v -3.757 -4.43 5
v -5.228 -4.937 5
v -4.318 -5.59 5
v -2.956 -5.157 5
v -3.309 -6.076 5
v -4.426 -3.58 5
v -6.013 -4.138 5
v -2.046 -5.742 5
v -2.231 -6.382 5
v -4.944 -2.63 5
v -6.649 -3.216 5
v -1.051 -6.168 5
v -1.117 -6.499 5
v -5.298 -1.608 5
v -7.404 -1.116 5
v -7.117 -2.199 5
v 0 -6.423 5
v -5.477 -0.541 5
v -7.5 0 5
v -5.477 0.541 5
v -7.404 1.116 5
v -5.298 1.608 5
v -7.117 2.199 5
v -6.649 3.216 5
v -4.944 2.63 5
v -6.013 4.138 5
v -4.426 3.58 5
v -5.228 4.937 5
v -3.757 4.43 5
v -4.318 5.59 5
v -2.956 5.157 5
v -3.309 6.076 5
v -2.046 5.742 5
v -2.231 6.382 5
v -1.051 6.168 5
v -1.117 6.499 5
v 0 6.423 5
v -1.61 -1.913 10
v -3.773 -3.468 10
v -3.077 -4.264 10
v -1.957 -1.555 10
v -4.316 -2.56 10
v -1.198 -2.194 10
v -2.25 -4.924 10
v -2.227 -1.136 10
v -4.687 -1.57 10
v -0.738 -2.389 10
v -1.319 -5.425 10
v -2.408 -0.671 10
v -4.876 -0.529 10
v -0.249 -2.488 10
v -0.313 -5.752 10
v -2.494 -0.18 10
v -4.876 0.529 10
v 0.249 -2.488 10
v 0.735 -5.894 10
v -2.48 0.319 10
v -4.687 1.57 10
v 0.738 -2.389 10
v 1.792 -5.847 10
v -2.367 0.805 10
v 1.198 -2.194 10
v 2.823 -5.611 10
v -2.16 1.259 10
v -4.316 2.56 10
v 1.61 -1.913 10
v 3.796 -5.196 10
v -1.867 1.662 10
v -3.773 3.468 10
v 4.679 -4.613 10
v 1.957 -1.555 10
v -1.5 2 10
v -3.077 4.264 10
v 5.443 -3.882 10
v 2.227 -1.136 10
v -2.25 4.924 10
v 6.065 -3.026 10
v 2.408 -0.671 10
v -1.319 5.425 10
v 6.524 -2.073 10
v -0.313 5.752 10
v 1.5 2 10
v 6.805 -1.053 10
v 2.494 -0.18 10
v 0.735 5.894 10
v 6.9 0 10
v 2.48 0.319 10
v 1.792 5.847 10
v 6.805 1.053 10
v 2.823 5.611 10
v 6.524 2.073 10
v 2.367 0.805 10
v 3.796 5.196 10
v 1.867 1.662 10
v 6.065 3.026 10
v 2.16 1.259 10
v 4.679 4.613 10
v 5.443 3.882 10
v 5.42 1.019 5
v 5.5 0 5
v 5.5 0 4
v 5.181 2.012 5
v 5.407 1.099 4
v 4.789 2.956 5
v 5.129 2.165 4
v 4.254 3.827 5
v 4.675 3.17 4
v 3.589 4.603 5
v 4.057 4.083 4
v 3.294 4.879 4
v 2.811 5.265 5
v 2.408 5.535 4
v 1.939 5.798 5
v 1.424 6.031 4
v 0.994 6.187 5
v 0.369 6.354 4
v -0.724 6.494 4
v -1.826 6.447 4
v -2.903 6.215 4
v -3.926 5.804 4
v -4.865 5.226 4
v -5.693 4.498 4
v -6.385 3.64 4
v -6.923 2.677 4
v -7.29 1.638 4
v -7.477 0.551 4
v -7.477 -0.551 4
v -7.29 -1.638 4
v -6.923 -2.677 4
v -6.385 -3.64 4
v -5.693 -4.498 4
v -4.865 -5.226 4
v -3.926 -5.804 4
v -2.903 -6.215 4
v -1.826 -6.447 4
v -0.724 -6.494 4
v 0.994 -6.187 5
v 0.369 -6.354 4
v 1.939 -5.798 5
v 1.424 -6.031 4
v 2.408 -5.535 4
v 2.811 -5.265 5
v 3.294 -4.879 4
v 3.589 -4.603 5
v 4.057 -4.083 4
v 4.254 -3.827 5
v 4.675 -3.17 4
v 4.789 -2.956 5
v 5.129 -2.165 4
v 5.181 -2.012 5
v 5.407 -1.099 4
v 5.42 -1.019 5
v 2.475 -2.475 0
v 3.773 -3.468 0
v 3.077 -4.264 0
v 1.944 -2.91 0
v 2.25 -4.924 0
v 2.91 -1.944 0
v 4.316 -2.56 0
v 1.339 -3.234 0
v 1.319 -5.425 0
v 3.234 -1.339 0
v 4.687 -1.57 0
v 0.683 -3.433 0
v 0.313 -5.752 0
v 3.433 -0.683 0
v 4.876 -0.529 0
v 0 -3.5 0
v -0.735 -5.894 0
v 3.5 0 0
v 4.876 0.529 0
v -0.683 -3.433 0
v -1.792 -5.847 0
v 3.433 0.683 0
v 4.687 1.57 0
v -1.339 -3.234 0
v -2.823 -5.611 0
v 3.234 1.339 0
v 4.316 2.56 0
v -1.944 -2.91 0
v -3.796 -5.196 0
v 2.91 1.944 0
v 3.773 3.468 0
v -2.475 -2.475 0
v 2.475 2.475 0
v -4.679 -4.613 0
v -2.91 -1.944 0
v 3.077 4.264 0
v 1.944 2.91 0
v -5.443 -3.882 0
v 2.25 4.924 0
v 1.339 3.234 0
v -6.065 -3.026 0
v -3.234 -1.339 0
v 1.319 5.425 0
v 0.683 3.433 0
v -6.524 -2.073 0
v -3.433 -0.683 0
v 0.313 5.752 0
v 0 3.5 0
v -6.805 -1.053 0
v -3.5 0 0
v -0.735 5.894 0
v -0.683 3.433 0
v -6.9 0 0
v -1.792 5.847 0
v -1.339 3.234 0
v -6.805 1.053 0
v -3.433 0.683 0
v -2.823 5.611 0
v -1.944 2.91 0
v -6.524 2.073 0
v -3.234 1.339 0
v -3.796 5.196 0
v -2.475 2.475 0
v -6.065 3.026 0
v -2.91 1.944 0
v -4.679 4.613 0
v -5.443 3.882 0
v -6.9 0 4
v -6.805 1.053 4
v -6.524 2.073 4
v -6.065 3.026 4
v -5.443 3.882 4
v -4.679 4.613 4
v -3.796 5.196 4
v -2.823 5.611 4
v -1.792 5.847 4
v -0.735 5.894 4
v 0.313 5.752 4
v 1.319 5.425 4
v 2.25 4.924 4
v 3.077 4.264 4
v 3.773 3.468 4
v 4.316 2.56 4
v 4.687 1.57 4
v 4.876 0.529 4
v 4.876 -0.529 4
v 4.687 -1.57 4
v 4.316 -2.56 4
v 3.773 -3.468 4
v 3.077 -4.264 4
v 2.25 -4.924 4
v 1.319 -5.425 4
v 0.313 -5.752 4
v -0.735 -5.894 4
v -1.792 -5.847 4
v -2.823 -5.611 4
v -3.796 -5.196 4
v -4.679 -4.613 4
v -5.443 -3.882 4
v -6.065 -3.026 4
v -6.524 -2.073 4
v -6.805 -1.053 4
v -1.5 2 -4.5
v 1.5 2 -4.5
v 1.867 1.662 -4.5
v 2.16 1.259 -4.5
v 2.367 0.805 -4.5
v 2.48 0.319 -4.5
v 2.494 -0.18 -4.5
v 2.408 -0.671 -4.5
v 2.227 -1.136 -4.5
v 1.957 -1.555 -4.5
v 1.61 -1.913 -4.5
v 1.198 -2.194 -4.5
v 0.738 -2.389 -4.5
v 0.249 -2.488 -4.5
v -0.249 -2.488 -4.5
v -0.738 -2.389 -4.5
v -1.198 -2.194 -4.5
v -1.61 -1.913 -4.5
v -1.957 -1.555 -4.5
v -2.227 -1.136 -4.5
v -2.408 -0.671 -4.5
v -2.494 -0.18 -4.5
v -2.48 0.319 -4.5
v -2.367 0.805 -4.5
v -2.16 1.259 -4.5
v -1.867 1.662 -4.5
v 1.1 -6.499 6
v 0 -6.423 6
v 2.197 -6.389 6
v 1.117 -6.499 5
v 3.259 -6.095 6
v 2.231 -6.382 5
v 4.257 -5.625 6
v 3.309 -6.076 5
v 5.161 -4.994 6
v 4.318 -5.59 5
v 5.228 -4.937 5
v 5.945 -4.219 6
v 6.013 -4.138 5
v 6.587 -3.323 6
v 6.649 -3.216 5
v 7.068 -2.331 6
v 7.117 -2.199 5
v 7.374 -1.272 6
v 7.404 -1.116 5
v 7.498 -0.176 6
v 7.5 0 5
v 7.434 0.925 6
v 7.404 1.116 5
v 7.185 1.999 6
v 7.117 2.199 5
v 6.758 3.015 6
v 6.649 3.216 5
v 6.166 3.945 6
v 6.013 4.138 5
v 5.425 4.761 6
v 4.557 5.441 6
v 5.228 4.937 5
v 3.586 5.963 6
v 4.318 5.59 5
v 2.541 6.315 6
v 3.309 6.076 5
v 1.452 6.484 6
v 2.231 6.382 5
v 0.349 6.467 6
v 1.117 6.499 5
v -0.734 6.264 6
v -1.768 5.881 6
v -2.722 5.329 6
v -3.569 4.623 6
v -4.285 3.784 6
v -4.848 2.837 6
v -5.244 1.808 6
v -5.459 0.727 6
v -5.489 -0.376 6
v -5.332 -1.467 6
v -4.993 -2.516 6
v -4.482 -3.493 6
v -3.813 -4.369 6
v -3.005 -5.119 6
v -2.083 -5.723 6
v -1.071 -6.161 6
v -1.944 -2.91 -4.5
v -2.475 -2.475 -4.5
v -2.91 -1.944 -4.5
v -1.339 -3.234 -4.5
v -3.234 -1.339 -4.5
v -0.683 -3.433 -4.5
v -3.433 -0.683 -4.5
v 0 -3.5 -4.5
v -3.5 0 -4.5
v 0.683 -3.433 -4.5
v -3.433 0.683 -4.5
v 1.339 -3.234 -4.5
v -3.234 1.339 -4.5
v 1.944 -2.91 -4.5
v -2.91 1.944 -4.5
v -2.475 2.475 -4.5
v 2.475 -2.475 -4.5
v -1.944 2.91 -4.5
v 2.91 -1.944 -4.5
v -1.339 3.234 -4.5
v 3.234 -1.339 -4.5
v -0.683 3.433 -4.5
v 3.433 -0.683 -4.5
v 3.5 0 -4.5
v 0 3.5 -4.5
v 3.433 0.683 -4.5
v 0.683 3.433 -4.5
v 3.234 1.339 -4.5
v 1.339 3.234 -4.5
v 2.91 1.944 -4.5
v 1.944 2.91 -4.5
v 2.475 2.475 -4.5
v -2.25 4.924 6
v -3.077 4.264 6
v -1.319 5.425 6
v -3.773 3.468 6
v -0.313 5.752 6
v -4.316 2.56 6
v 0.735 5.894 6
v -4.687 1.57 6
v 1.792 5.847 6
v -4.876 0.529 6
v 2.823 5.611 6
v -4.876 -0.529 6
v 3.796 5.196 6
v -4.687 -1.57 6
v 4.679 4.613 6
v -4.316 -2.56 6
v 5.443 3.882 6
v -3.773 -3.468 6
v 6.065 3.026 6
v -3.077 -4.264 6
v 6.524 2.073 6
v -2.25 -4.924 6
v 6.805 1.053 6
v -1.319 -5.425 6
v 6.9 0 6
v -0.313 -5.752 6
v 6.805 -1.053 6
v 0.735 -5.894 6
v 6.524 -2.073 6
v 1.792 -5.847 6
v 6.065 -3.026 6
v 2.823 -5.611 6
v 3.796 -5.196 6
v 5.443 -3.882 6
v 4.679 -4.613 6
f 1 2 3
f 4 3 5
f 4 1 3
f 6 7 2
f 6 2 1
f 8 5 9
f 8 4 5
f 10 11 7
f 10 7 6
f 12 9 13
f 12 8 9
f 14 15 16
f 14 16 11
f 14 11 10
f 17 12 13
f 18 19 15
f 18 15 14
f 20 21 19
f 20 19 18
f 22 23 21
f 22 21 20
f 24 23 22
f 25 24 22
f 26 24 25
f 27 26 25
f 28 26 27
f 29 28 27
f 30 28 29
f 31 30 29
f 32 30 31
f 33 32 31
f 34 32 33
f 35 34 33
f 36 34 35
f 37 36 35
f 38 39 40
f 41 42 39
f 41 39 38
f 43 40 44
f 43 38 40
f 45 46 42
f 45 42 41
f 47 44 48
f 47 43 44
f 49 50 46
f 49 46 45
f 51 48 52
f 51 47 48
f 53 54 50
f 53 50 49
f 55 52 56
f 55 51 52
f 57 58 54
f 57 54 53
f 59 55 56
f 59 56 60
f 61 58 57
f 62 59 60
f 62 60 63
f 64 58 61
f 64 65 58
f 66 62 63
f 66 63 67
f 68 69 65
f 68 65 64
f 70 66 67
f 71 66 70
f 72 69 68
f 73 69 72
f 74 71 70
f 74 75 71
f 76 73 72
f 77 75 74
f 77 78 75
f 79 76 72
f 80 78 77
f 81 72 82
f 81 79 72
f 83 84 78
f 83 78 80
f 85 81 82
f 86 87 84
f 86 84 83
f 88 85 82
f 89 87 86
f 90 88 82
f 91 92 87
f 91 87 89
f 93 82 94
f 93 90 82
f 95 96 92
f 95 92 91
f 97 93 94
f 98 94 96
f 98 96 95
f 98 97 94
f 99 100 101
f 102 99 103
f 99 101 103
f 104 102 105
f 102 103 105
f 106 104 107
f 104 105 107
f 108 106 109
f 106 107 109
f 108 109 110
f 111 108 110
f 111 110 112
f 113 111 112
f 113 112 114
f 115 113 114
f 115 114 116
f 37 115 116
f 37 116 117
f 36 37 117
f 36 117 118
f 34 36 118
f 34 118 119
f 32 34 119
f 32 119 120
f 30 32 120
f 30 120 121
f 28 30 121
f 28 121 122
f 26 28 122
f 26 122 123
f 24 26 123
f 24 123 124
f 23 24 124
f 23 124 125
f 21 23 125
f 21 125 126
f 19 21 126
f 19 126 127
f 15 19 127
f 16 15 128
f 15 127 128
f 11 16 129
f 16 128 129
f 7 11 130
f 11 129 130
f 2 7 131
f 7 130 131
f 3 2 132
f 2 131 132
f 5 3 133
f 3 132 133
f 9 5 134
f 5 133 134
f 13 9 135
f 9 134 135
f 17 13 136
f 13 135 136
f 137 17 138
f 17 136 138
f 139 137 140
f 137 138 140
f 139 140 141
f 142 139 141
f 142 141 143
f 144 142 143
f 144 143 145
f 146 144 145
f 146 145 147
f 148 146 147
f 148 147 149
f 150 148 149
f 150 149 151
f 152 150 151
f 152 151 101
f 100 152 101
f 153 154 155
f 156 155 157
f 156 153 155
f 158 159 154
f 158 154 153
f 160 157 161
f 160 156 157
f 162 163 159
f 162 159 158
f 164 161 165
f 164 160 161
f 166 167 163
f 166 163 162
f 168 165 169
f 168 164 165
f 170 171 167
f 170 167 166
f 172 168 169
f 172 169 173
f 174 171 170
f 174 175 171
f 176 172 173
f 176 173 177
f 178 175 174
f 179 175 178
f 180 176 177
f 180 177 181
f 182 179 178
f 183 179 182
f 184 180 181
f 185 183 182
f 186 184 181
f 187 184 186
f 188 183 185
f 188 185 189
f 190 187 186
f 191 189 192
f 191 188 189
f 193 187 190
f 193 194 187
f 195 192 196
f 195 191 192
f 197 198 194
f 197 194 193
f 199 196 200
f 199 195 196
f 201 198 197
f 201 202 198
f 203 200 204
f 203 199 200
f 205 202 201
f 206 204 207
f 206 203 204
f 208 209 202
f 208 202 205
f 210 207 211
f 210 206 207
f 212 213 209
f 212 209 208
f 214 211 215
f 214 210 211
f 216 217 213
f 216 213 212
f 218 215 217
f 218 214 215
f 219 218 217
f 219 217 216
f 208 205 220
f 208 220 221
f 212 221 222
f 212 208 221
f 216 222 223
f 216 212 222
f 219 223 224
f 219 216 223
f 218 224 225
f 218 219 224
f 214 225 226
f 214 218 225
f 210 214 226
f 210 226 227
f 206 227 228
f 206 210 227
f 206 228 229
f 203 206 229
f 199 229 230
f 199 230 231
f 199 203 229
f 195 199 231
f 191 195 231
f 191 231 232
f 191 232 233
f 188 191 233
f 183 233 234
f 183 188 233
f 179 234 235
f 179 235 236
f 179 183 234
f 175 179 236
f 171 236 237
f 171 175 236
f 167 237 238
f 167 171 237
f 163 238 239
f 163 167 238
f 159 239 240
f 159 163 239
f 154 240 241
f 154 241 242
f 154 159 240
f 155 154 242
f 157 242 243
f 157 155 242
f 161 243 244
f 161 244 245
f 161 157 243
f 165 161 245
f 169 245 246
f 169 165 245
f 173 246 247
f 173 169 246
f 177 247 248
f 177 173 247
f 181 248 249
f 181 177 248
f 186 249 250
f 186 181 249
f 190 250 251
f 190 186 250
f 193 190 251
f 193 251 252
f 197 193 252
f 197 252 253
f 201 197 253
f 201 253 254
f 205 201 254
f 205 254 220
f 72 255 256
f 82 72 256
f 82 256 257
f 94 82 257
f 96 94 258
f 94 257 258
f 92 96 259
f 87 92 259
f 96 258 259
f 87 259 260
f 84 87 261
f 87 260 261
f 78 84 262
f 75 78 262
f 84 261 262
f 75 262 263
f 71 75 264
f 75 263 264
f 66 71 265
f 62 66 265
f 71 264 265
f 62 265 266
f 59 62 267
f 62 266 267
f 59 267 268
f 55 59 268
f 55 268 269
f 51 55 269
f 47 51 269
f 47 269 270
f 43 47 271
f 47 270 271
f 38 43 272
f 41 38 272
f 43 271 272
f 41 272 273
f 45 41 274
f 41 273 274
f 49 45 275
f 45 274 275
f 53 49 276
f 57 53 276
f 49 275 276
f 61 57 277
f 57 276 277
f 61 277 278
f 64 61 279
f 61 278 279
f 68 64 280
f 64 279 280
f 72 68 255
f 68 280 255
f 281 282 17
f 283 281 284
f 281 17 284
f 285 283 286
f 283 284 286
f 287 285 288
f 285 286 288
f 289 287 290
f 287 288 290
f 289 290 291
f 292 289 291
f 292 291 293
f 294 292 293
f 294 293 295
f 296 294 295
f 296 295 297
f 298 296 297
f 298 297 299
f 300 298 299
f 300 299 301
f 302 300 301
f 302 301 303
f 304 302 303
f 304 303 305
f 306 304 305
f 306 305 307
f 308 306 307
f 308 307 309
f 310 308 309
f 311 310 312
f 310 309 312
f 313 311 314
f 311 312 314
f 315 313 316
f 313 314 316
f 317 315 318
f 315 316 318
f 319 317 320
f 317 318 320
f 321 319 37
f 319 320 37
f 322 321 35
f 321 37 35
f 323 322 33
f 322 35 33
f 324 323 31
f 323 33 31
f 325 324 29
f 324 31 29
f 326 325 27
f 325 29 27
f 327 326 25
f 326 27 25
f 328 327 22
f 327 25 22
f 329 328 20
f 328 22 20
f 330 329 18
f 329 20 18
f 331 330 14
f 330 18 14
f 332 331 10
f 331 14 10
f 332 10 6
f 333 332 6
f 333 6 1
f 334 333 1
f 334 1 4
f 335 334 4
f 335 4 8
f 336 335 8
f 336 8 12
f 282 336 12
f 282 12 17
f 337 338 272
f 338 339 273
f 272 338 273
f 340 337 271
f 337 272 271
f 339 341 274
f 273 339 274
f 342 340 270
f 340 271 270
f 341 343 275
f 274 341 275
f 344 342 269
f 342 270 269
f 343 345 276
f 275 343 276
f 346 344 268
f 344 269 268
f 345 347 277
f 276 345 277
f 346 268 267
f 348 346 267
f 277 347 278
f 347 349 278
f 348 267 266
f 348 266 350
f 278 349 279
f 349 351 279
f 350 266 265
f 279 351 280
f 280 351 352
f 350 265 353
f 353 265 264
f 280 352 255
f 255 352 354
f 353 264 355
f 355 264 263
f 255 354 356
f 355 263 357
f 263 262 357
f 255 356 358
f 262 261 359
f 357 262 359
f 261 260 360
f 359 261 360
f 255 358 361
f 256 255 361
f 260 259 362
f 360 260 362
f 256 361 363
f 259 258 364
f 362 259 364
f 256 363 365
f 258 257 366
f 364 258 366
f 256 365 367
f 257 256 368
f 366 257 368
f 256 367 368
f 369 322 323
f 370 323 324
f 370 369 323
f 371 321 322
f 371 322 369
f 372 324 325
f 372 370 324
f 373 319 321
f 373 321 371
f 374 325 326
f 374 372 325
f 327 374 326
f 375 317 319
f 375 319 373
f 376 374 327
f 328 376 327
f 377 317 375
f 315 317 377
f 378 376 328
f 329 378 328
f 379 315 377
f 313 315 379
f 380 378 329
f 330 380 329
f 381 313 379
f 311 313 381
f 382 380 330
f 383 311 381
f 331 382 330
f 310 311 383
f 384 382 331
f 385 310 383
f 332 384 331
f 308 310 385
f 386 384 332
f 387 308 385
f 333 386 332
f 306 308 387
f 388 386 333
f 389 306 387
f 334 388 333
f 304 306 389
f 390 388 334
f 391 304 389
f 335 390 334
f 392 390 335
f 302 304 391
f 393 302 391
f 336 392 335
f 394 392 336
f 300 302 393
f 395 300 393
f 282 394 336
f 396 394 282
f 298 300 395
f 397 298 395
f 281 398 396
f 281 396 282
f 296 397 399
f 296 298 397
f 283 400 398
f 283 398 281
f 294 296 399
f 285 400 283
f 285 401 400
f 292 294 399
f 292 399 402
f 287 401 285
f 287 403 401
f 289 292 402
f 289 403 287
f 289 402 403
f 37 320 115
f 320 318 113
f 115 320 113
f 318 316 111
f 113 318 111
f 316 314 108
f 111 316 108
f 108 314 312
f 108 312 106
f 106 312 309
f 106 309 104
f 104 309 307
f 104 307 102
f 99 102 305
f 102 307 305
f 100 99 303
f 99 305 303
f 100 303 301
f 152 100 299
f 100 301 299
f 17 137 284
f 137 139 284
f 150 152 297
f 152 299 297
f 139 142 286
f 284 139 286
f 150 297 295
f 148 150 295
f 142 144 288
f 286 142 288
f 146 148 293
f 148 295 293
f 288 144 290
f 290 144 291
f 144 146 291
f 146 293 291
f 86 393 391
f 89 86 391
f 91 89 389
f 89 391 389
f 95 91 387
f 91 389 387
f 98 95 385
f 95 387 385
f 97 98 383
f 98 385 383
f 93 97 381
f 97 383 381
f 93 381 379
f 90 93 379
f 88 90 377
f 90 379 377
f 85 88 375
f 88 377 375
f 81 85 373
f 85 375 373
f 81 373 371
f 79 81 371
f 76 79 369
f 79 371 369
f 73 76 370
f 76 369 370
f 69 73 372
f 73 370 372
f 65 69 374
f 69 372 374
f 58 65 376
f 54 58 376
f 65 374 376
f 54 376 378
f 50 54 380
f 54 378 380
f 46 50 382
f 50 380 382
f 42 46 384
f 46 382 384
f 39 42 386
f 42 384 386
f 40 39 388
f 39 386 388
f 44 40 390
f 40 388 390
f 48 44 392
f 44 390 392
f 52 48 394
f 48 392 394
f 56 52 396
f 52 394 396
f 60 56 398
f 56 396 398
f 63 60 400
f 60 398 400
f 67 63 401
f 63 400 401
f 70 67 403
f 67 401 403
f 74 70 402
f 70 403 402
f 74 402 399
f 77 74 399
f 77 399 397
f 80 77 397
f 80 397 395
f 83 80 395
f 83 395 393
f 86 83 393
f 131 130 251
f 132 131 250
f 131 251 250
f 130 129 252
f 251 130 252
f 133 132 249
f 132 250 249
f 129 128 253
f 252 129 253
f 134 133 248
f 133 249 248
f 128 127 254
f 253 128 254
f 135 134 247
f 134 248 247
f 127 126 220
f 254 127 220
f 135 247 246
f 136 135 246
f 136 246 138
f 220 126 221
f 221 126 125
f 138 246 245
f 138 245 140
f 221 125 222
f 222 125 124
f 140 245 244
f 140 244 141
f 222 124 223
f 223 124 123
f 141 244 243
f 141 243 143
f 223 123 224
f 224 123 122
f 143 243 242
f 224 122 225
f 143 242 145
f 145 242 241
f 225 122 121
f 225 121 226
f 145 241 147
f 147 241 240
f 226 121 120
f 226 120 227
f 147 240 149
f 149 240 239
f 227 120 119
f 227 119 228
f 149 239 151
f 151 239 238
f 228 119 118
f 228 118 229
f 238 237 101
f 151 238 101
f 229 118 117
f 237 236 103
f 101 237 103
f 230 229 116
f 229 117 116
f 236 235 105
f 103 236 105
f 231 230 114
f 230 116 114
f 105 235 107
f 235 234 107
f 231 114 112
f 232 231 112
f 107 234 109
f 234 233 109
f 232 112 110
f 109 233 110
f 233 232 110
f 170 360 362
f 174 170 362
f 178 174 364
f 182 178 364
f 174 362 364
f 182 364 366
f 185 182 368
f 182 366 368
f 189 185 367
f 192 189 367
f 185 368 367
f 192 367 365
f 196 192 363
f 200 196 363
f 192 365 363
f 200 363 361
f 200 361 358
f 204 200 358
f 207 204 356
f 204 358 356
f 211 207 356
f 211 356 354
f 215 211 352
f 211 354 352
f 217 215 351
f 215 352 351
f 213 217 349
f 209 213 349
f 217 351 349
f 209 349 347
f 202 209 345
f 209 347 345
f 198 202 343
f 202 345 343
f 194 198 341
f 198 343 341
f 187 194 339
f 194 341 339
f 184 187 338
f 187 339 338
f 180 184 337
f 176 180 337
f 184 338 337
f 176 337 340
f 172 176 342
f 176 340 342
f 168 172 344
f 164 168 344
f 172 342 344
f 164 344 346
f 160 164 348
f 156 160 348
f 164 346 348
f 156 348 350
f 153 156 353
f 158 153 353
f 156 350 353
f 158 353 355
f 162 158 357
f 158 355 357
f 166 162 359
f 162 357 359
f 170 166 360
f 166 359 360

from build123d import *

# Parameters (mm, degrees)
SKETCH1_R           = 3.5
BOSS_EXTRUDE1_DEPTH = 10
SKETCH2_R           = 5.9
SKETCH2_R_2         = 3.5
BOSS_EXTRUDE2_DEPTH = 4
SKETCH3_R           = 6.5
BOSS_EXTRUDE3_DEPTH = 1
SKETCH4_R           = 6.5
BOSS_EXTRUDE4_DEPTH = 1
SKETCH5_R           = 5.9
BOSS_EXTRUDE5_DEPTH = 4
BOSS_EXTRUDE6_START = -4.5
SKETCH1_2_R         = 3.5
BOSS_EXTRUDE6_DEPTH = 4.5


with BuildPart() as part:
    # Sketch1 → Boss-Extrude1 (new body)
    with BuildSketch(Plane.XY):
        Circle(SKETCH1_R)
        with BuildLine():
            Line((-1.5, 2), (1.5, 2))
            ThreePointArc((1.5, 2), (0, -2.5), (-1.5, 2))
        make_face(mode=Mode.SUBTRACT)
    extrude(amount=BOSS_EXTRUDE1_DEPTH)

    # Sketch2 → Boss-Extrude2 (add)
    with BuildSketch(Plane(origin=(0, 0, 0), x_dir=(-1, 0, 0), z_dir=(0, 0, -1))):
        with Locations((1, 0)):
            Circle(SKETCH2_R)
        Circle(SKETCH2_R_2, mode=Mode.SUBTRACT)
    extrude(amount=-BOSS_EXTRUDE2_DEPTH)

    # Sketch3 → Boss-Extrude3 (add)
    with BuildSketch(Plane.XY.offset(4)):
        with Locations((-1, 0)):
            Circle(SKETCH3_R)
        with BuildLine():
            Line((1.5, 2), (-1.5, 2))
            ThreePointArc((-1.5, 2), (0, -2.5), (1.5, 2))
        make_face(mode=Mode.SUBTRACT)
    extrude(amount=BOSS_EXTRUDE3_DEPTH)

    # Sketch4 → Boss-Extrude4 (add)
    with BuildSketch(Plane.XY.offset(5)):
        with Locations((1, 0)):
            Circle(SKETCH4_R)
        with BuildLine():
            Line((1.5, 2), (-1.5, 2))
            ThreePointArc((-1.5, 2), (0, -2.5), (1.5, 2))
        make_face(mode=Mode.SUBTRACT)
    extrude(amount=BOSS_EXTRUDE4_DEPTH)

    # Sketch5 → Boss-Extrude5 (add)
    with BuildSketch(Plane.XY.offset(6)):
        with Locations((1, 0)):
            Circle(SKETCH5_R)
        with BuildLine():
            Line((1.5, 2), (-1.5, 2))
            ThreePointArc((-1.5, 2), (0, -2.5), (1.5, 2))
        make_face(mode=Mode.SUBTRACT)
    extrude(amount=BOSS_EXTRUDE5_DEPTH)

    # Sketch1<2> → Boss-Extrude6 (add)
    with BuildSketch(Plane.XY.offset(BOSS_EXTRUDE6_START)):
        Circle(SKETCH1_2_R)
        with BuildLine():
            Line((-1.5, 2), (1.5, 2))
            ThreePointArc((1.5, 2), (0, -2.5), (-1.5, 2))
        make_face(mode=Mode.SUBTRACT)
    extrude(amount=BOSS_EXTRUDE6_DEPTH)


solid = part.part
